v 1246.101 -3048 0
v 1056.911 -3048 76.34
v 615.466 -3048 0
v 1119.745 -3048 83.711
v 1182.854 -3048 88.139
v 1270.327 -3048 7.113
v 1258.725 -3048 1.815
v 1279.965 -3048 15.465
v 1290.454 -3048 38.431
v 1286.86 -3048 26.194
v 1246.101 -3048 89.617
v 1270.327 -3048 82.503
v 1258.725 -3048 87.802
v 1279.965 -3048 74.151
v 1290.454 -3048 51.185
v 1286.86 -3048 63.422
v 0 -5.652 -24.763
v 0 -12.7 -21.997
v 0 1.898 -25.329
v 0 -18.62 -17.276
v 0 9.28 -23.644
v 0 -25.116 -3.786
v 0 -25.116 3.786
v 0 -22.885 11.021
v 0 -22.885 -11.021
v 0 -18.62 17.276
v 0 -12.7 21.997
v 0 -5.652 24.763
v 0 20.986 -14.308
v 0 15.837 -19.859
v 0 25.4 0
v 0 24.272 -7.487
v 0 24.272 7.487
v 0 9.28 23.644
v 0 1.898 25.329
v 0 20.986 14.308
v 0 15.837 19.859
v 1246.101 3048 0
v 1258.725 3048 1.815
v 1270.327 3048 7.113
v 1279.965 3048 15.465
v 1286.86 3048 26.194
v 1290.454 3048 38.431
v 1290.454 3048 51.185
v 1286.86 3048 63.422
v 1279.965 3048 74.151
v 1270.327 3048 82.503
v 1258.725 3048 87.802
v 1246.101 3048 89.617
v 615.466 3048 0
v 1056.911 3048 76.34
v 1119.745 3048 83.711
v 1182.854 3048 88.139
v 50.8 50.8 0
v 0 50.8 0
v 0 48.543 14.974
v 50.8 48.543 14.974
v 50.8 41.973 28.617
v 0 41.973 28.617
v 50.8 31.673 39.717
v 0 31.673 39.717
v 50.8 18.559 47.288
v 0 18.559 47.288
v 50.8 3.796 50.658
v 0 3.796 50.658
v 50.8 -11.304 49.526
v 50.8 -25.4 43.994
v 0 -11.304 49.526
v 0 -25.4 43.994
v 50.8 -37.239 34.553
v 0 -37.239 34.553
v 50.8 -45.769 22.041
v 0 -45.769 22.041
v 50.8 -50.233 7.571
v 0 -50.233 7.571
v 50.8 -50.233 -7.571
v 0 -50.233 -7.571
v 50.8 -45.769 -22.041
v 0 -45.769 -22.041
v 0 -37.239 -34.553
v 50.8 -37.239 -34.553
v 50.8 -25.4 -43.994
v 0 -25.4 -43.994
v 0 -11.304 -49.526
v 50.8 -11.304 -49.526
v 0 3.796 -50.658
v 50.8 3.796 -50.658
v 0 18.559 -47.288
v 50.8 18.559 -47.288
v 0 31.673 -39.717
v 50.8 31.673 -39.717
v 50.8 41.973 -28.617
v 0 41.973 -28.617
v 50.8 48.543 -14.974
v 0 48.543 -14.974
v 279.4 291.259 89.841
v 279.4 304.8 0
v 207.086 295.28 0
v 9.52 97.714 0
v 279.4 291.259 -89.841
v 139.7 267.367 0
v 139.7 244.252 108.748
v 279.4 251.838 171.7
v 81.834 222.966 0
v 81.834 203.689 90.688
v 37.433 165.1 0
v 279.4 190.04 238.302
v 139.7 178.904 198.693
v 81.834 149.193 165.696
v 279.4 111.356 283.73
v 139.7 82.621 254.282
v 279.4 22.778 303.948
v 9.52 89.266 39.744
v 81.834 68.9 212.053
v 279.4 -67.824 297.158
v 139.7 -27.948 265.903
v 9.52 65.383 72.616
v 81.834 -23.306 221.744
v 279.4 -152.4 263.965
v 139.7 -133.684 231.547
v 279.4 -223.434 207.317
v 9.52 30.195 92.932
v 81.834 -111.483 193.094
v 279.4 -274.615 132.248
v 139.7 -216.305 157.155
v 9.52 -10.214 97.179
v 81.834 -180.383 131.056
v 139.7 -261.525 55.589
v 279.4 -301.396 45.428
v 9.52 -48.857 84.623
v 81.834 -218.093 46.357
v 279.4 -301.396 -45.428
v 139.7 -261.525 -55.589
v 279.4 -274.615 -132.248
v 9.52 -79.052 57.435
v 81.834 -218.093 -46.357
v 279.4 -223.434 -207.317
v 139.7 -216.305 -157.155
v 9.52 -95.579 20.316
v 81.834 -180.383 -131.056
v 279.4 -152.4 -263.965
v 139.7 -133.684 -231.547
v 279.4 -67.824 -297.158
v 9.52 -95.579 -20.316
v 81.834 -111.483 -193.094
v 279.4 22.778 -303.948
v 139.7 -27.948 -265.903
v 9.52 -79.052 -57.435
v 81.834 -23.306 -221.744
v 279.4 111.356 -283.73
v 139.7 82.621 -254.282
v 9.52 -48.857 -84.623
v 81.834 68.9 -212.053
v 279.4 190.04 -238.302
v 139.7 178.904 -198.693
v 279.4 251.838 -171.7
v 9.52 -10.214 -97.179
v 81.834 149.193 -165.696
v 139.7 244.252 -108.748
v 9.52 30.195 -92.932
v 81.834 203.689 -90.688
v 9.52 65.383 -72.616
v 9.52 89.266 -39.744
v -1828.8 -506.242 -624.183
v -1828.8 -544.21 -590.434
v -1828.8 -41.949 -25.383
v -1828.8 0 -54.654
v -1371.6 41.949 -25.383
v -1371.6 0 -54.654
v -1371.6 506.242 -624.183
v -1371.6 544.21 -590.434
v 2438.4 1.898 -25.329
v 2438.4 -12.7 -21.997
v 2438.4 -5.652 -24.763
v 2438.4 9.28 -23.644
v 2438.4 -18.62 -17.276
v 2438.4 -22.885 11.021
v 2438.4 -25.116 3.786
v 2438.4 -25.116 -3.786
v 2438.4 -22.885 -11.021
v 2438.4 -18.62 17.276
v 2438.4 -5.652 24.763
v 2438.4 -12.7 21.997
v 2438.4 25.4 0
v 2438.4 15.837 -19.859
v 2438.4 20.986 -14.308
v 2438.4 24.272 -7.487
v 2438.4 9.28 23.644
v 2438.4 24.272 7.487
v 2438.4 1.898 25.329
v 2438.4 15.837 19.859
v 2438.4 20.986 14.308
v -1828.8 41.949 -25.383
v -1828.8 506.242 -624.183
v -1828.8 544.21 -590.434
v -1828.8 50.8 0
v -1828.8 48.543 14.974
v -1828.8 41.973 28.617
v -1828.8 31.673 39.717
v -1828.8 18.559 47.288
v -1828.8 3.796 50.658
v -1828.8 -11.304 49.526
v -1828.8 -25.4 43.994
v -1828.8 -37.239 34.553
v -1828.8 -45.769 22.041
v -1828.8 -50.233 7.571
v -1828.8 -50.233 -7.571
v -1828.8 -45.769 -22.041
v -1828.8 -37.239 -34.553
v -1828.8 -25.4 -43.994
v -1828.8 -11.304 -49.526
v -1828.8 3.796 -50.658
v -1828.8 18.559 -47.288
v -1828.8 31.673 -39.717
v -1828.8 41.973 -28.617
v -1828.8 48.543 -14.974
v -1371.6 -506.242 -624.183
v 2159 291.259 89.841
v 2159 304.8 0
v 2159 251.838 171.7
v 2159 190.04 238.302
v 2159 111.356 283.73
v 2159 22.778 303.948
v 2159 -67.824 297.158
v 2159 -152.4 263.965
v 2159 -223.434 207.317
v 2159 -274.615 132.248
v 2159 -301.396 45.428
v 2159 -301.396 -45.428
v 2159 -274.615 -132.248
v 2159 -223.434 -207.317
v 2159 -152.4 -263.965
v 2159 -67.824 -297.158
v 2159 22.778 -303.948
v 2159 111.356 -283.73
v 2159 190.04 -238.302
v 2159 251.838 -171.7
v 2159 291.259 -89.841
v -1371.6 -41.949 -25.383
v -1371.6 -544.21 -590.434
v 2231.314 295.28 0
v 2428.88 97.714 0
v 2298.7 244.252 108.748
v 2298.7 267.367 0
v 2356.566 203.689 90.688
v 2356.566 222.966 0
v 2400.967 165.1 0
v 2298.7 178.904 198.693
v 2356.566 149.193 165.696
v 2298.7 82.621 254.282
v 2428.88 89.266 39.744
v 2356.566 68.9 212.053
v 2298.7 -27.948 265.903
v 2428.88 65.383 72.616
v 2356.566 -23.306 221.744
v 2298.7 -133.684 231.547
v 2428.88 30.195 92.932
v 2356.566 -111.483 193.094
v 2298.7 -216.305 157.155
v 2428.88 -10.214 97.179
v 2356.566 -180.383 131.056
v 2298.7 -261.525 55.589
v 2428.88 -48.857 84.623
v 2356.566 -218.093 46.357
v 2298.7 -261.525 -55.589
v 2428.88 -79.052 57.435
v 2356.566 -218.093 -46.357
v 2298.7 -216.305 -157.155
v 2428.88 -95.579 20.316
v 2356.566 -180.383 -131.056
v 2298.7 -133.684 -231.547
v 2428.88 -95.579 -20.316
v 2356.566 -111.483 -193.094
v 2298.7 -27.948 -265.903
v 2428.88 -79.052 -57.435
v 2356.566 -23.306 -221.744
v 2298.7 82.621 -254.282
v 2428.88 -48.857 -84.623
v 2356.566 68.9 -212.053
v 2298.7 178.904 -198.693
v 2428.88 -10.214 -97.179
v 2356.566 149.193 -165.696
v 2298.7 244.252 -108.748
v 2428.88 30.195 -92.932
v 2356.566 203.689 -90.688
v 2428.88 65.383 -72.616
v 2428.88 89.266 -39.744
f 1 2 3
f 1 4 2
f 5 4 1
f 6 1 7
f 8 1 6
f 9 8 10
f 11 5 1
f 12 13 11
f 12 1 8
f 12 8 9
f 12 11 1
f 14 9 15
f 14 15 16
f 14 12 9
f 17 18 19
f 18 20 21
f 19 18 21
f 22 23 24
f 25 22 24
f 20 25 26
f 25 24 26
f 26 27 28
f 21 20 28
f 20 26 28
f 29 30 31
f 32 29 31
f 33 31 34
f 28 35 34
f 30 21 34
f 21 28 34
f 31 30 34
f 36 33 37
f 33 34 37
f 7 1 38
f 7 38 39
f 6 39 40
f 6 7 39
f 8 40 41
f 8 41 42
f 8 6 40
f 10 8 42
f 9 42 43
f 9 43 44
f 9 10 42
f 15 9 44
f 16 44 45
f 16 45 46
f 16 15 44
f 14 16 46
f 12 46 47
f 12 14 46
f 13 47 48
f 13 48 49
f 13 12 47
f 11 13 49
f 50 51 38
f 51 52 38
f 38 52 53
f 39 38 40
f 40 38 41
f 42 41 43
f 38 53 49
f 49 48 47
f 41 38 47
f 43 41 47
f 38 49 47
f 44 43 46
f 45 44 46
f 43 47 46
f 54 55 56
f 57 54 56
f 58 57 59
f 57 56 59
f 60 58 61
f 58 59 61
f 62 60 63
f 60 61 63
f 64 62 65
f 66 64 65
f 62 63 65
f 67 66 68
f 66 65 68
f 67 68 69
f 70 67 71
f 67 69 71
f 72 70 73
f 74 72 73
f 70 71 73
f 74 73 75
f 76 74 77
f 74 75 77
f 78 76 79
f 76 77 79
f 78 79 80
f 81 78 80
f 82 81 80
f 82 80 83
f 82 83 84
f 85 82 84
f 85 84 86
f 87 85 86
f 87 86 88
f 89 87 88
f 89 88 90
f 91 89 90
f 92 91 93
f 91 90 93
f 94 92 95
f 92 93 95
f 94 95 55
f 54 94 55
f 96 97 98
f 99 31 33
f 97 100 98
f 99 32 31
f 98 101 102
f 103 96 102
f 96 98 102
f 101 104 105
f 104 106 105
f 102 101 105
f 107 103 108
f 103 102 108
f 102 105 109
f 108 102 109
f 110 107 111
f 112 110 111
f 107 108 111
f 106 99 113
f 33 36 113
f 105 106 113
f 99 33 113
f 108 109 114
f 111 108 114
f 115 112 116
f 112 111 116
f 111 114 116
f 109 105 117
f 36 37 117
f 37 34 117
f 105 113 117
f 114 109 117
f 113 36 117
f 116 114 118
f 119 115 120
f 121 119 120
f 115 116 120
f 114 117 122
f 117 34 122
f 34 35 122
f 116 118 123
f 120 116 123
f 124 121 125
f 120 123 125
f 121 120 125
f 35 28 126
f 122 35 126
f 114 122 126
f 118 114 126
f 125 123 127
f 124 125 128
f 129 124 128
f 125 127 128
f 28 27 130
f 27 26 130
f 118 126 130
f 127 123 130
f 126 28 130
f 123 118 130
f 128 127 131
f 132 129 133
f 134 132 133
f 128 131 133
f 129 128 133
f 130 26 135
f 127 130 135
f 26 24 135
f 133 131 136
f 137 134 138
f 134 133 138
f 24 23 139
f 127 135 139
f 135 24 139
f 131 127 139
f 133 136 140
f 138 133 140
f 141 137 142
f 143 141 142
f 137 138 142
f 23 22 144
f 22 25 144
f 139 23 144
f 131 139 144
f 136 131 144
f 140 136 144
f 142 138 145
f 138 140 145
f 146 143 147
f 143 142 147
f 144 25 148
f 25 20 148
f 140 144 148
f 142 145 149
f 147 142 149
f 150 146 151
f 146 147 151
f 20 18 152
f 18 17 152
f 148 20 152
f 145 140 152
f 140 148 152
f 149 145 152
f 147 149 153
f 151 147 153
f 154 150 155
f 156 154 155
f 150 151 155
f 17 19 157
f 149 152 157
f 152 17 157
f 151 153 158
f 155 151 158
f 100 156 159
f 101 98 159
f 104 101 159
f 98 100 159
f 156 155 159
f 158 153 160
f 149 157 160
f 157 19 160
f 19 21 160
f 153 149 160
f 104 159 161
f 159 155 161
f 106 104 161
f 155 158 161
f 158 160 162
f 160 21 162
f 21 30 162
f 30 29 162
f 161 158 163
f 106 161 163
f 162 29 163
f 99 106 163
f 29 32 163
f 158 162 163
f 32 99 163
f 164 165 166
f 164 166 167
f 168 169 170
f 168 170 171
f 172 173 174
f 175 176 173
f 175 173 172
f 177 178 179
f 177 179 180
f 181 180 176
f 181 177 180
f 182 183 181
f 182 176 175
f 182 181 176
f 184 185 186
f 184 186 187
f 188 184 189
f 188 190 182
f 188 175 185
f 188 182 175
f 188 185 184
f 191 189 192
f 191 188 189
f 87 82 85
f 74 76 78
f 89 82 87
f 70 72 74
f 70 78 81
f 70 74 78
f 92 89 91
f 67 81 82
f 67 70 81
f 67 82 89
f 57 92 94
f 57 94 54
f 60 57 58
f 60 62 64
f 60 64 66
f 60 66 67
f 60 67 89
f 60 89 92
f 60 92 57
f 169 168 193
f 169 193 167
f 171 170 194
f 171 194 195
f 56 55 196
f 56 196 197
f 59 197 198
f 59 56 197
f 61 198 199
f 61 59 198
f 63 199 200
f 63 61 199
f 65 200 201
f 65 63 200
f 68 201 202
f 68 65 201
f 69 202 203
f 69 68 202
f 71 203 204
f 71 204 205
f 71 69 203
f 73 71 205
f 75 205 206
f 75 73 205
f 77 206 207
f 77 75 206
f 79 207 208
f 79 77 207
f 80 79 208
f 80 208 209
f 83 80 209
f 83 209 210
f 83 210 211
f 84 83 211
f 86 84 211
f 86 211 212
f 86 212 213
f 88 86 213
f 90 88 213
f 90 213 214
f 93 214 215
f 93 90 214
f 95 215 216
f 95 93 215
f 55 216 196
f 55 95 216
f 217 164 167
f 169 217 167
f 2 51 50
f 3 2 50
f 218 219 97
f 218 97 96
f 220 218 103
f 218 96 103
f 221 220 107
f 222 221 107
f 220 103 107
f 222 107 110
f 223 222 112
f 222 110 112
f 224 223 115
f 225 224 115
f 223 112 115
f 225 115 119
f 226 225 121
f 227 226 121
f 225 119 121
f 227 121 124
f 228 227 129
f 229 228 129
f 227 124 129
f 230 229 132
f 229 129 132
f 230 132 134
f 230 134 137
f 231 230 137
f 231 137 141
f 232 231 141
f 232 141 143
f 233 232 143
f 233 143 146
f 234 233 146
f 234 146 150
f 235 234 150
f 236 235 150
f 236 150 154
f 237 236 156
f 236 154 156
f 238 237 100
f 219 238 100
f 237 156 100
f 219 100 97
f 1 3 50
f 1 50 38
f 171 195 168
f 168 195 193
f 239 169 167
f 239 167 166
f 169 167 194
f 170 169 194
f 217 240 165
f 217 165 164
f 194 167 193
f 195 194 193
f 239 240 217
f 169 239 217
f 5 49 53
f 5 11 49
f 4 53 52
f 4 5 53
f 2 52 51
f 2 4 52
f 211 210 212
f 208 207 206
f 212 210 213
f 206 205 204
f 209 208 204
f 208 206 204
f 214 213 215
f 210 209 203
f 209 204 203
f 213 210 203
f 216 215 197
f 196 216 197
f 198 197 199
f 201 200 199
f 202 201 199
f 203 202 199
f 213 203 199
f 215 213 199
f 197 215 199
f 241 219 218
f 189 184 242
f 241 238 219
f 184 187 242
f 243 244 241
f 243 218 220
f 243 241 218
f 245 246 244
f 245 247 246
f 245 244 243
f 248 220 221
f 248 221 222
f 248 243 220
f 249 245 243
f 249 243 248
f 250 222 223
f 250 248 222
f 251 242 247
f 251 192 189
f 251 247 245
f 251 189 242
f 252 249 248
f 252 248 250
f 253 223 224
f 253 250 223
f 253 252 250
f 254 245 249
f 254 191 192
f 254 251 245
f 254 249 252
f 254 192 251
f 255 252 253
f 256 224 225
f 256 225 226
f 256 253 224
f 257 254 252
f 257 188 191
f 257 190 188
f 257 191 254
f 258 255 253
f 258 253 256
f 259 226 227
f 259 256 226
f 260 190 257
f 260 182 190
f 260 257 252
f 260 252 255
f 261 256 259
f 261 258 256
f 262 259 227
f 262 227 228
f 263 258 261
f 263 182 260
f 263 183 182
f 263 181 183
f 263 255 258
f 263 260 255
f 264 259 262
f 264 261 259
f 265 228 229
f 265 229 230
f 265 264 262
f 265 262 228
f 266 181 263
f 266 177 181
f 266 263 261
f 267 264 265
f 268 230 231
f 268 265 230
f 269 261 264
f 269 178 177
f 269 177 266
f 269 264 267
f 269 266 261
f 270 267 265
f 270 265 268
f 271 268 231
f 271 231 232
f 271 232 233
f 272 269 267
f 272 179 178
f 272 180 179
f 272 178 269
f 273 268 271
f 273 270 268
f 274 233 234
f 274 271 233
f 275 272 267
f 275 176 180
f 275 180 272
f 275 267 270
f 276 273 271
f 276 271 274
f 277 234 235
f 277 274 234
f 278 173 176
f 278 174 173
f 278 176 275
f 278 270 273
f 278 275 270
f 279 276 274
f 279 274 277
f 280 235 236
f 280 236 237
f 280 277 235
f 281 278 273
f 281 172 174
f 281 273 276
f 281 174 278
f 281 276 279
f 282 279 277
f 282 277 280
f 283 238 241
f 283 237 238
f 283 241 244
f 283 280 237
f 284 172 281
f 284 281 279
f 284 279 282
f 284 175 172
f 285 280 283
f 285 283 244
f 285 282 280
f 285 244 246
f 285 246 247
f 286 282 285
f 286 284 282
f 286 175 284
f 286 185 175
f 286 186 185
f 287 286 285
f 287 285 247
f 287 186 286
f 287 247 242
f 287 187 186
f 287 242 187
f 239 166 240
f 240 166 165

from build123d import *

# Parameters (mm, degrees)
F0_R          = 304.8
F1_DEPTH      = 2438.4
F2_R          = 279.4
F4_DEPTH      = 3048
F5_R          = 50.8
F6_DEPTH      = 1828.8
F6_DEPTH_BACK = 50.8
F9_DEPTH      = 457.2


with BuildPart() as f1:
    # F0 (on Right) → F1 (new body)
    with BuildSketch(Plane.YZ):
        Circle(F0_R)
    extrude(amount=F1_DEPTH)

    # F2
    f2_edges = [f1.edges().sort_by_distance(p)[0] for p in [
        (2438.4, -304.8, 0),
        (0, -304.8, 0),
    ]]
    fillet(f2_edges, radius=F2_R)


with BuildPart() as f4:
    # F3 (on Front) → F4 (new body, symmetric)
    with BuildSketch(Plane.XZ):
        with BuildLine():
            Line((1056.9108128548, 76.3400439173), (615.4662966728, 0))
            Line((615.4662966728, 0), (1246.1014389992, 0))
            ThreePointArc((1246.1014389992, 0), (1290.909727104, 44.8082881048), (1246.1014389992, 89.6165762097))
            ThreePointArc((1246.1014389992, 89.6165762097), (1151.2734904151, 86.2933668251), (1056.9108128548, 76.3400439173))
        make_face()
    extrude(amount=F4_DEPTH, both=True)


with BuildPart() as f6:
    # F5 (on Right) → F6 (new body, two sides)
    with BuildSketch(Plane.YZ) as f6_sk:
        Circle(F5_R)
    extrude(amount=-F6_DEPTH)
    extrude(f6_sk.sketch, amount=F6_DEPTH_BACK)


with BuildPart() as f9:
    # F8 (on offset) → F9 (new body)
    with BuildSketch(Plane.YZ.offset(-1828.8)):
        Polygon((41.949292923, -25.3832764938), (0, -54.6543938773), (506.2418571272, -624.1833063062), (544.2104512891, -590.4338491644), align=None)
    extrude(amount=F9_DEPTH)


with BuildPart() as f9b:
    # F8 (on offset) → F9, piece 2 (new body)
    with BuildSketch(Plane.YZ.offset(-1828.8)):
        Polygon((-506.2418571272, -624.1833063062), (0, -54.6543938773), (-41.949292923, -25.3832764938), (-544.2104512891, -590.4338491644), align=None)
    extrude(amount=F9_DEPTH)


solid = Compound([f1.part, f4.part, f6.part, f9.part, f9b.part])
